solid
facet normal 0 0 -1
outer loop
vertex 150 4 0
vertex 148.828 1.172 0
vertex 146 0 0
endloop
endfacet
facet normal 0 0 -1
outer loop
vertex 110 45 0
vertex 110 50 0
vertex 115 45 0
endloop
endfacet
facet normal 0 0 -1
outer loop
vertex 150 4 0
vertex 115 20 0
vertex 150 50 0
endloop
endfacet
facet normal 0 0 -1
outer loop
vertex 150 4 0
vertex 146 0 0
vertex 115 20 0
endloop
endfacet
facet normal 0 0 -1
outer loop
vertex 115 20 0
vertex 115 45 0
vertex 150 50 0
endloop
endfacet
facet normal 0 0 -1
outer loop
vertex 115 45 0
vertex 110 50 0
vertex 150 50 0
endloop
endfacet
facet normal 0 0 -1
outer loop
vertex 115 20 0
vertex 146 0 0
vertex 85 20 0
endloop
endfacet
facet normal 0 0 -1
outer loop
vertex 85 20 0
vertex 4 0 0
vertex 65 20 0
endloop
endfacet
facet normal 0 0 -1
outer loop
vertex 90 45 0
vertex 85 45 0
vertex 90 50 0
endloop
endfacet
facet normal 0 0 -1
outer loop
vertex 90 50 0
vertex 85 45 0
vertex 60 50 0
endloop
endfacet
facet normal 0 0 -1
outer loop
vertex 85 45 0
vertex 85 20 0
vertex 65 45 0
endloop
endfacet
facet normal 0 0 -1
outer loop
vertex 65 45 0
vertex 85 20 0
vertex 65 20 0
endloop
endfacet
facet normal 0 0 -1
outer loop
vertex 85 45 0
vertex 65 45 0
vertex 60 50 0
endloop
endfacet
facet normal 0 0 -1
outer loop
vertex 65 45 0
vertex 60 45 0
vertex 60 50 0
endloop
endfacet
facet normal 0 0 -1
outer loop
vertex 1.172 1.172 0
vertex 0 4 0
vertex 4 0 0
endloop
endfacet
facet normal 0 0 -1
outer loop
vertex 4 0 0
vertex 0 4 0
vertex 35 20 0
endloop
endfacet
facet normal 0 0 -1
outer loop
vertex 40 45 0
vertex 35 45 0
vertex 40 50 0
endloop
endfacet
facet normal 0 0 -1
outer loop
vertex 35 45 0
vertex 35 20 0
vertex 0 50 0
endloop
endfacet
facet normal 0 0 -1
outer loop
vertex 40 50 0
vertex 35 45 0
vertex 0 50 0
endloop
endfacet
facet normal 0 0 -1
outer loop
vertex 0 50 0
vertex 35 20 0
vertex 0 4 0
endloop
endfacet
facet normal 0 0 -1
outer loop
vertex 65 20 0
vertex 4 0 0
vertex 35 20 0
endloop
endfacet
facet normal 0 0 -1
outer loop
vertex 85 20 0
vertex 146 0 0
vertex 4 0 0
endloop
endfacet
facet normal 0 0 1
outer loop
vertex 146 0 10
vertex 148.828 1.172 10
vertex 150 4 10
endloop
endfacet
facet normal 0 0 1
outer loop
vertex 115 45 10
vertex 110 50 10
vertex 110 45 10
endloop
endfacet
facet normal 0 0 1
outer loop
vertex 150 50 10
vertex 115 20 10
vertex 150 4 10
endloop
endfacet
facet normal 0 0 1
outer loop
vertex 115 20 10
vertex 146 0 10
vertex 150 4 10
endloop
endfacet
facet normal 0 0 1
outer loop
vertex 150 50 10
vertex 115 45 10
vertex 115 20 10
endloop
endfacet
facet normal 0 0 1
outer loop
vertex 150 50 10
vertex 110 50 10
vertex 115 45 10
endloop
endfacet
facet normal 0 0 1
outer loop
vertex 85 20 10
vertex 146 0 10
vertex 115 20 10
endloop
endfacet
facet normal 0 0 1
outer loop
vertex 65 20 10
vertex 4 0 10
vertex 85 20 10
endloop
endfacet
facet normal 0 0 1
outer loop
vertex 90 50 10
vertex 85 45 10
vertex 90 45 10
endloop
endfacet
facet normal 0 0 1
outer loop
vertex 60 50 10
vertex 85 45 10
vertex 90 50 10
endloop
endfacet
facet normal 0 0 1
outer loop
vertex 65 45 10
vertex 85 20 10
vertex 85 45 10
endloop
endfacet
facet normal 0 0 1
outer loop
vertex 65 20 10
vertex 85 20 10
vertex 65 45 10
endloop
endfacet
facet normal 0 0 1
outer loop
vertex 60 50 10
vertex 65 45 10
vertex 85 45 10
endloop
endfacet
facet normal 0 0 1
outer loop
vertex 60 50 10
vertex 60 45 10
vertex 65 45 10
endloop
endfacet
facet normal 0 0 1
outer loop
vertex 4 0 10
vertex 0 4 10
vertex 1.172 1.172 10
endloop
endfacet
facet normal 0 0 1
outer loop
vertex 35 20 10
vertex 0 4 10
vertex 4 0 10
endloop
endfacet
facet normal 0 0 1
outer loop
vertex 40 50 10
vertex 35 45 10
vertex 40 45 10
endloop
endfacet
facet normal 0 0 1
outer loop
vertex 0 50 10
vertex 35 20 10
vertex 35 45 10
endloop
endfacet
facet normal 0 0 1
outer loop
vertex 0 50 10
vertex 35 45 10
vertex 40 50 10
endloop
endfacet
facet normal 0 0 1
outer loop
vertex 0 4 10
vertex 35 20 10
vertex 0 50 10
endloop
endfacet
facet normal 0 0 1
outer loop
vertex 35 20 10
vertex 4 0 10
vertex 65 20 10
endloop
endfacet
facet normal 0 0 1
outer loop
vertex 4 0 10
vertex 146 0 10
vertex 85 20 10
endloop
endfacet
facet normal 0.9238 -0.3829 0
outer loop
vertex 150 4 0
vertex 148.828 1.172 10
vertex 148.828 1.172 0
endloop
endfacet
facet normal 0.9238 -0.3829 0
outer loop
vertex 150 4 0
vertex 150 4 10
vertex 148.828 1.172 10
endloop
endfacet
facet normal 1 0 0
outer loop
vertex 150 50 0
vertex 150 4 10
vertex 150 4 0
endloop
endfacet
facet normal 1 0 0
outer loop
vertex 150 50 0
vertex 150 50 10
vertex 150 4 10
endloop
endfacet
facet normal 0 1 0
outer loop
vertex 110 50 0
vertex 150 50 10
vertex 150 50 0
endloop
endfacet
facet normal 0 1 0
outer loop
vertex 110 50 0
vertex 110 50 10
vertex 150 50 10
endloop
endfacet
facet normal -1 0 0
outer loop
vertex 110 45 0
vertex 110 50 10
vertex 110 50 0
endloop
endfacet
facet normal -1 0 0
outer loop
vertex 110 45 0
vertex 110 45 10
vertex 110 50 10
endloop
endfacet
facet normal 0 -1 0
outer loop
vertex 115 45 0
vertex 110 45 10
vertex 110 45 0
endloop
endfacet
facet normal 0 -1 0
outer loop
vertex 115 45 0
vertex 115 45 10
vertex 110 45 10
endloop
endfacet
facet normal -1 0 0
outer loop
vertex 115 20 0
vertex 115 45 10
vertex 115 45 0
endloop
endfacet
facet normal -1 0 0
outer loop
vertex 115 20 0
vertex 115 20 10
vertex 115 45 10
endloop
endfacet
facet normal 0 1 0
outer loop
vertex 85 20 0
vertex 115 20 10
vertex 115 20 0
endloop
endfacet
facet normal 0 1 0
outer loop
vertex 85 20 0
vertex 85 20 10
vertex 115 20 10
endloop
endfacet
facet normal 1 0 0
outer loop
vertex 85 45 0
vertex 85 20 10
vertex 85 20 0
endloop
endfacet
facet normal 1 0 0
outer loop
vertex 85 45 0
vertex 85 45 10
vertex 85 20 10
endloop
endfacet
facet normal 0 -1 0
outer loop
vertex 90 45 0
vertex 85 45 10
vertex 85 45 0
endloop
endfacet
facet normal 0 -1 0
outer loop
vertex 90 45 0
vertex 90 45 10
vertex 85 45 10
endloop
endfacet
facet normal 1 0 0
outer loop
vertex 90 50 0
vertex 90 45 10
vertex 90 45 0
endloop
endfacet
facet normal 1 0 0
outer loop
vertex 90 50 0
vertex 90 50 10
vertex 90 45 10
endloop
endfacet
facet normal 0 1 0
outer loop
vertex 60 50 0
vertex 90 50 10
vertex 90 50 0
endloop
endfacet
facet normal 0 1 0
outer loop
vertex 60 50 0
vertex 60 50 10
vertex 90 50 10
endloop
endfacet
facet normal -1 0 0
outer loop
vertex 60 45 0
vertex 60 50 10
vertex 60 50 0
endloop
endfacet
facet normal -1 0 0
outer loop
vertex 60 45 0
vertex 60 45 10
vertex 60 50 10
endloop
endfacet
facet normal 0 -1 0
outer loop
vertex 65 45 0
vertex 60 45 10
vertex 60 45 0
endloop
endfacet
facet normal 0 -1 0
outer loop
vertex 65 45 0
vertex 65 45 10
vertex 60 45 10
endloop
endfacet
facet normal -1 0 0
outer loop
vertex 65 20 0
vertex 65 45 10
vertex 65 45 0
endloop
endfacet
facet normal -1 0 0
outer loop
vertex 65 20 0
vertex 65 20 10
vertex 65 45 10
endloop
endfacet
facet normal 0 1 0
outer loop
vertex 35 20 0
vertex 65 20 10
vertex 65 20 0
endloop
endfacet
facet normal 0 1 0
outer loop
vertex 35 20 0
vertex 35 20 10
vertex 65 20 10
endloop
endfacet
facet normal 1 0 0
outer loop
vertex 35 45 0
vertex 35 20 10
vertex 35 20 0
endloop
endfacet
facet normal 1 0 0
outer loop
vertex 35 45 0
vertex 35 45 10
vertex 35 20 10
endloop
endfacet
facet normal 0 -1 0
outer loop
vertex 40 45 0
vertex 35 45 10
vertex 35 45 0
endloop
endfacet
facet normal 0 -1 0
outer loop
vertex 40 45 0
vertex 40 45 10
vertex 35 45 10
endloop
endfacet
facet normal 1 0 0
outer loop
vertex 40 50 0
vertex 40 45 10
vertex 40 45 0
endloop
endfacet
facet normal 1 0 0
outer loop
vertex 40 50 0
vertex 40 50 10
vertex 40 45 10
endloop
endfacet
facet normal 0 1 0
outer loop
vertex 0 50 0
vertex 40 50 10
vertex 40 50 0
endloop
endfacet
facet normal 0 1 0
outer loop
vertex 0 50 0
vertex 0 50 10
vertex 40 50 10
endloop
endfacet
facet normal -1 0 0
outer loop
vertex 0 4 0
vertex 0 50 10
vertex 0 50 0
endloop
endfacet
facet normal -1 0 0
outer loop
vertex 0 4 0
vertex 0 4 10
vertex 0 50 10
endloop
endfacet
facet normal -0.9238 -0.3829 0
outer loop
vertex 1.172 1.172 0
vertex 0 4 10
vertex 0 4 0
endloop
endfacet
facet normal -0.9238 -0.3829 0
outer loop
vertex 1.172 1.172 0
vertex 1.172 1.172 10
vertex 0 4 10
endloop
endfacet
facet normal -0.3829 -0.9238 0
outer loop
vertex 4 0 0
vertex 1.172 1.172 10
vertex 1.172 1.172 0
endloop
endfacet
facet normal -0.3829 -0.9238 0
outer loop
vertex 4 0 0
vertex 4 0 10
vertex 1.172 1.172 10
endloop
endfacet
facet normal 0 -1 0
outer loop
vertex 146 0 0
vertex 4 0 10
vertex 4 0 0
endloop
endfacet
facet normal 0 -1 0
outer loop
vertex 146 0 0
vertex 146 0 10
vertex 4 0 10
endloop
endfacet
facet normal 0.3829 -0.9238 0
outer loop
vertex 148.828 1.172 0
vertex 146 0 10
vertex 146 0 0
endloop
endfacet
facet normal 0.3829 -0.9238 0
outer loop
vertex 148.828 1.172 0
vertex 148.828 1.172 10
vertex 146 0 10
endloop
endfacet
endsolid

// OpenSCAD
$fn = 32;

// ----------------------------------------------------------------------
// Oversize slot bar: 150 mm bar with 2 oversize windows
// ----------------------------------------------------------------------

// --- parameters (mm) ---
profile_height = 10;      // extrusion height
profile_points = 24;      // points of the closed outline

profile = [[0, 4], [1.172, 1.172], [4, 0], [146, 0], [148.828, 1.172], [150, 4], [150, 50], [110, 50], [110, 45], [115, 45], [115, 20], [85, 20], [85, 45], [90, 45], [90, 50], [60, 50], [60, 45], [65, 45], [65, 20], [35, 20], [35, 45], [40, 45], [40, 50], [0, 50]];  // single closed polygon, 24 points, counter clockwise

// --- the one profile operation ---
linear_extrude(height = profile_height) polygon(points = profile);
